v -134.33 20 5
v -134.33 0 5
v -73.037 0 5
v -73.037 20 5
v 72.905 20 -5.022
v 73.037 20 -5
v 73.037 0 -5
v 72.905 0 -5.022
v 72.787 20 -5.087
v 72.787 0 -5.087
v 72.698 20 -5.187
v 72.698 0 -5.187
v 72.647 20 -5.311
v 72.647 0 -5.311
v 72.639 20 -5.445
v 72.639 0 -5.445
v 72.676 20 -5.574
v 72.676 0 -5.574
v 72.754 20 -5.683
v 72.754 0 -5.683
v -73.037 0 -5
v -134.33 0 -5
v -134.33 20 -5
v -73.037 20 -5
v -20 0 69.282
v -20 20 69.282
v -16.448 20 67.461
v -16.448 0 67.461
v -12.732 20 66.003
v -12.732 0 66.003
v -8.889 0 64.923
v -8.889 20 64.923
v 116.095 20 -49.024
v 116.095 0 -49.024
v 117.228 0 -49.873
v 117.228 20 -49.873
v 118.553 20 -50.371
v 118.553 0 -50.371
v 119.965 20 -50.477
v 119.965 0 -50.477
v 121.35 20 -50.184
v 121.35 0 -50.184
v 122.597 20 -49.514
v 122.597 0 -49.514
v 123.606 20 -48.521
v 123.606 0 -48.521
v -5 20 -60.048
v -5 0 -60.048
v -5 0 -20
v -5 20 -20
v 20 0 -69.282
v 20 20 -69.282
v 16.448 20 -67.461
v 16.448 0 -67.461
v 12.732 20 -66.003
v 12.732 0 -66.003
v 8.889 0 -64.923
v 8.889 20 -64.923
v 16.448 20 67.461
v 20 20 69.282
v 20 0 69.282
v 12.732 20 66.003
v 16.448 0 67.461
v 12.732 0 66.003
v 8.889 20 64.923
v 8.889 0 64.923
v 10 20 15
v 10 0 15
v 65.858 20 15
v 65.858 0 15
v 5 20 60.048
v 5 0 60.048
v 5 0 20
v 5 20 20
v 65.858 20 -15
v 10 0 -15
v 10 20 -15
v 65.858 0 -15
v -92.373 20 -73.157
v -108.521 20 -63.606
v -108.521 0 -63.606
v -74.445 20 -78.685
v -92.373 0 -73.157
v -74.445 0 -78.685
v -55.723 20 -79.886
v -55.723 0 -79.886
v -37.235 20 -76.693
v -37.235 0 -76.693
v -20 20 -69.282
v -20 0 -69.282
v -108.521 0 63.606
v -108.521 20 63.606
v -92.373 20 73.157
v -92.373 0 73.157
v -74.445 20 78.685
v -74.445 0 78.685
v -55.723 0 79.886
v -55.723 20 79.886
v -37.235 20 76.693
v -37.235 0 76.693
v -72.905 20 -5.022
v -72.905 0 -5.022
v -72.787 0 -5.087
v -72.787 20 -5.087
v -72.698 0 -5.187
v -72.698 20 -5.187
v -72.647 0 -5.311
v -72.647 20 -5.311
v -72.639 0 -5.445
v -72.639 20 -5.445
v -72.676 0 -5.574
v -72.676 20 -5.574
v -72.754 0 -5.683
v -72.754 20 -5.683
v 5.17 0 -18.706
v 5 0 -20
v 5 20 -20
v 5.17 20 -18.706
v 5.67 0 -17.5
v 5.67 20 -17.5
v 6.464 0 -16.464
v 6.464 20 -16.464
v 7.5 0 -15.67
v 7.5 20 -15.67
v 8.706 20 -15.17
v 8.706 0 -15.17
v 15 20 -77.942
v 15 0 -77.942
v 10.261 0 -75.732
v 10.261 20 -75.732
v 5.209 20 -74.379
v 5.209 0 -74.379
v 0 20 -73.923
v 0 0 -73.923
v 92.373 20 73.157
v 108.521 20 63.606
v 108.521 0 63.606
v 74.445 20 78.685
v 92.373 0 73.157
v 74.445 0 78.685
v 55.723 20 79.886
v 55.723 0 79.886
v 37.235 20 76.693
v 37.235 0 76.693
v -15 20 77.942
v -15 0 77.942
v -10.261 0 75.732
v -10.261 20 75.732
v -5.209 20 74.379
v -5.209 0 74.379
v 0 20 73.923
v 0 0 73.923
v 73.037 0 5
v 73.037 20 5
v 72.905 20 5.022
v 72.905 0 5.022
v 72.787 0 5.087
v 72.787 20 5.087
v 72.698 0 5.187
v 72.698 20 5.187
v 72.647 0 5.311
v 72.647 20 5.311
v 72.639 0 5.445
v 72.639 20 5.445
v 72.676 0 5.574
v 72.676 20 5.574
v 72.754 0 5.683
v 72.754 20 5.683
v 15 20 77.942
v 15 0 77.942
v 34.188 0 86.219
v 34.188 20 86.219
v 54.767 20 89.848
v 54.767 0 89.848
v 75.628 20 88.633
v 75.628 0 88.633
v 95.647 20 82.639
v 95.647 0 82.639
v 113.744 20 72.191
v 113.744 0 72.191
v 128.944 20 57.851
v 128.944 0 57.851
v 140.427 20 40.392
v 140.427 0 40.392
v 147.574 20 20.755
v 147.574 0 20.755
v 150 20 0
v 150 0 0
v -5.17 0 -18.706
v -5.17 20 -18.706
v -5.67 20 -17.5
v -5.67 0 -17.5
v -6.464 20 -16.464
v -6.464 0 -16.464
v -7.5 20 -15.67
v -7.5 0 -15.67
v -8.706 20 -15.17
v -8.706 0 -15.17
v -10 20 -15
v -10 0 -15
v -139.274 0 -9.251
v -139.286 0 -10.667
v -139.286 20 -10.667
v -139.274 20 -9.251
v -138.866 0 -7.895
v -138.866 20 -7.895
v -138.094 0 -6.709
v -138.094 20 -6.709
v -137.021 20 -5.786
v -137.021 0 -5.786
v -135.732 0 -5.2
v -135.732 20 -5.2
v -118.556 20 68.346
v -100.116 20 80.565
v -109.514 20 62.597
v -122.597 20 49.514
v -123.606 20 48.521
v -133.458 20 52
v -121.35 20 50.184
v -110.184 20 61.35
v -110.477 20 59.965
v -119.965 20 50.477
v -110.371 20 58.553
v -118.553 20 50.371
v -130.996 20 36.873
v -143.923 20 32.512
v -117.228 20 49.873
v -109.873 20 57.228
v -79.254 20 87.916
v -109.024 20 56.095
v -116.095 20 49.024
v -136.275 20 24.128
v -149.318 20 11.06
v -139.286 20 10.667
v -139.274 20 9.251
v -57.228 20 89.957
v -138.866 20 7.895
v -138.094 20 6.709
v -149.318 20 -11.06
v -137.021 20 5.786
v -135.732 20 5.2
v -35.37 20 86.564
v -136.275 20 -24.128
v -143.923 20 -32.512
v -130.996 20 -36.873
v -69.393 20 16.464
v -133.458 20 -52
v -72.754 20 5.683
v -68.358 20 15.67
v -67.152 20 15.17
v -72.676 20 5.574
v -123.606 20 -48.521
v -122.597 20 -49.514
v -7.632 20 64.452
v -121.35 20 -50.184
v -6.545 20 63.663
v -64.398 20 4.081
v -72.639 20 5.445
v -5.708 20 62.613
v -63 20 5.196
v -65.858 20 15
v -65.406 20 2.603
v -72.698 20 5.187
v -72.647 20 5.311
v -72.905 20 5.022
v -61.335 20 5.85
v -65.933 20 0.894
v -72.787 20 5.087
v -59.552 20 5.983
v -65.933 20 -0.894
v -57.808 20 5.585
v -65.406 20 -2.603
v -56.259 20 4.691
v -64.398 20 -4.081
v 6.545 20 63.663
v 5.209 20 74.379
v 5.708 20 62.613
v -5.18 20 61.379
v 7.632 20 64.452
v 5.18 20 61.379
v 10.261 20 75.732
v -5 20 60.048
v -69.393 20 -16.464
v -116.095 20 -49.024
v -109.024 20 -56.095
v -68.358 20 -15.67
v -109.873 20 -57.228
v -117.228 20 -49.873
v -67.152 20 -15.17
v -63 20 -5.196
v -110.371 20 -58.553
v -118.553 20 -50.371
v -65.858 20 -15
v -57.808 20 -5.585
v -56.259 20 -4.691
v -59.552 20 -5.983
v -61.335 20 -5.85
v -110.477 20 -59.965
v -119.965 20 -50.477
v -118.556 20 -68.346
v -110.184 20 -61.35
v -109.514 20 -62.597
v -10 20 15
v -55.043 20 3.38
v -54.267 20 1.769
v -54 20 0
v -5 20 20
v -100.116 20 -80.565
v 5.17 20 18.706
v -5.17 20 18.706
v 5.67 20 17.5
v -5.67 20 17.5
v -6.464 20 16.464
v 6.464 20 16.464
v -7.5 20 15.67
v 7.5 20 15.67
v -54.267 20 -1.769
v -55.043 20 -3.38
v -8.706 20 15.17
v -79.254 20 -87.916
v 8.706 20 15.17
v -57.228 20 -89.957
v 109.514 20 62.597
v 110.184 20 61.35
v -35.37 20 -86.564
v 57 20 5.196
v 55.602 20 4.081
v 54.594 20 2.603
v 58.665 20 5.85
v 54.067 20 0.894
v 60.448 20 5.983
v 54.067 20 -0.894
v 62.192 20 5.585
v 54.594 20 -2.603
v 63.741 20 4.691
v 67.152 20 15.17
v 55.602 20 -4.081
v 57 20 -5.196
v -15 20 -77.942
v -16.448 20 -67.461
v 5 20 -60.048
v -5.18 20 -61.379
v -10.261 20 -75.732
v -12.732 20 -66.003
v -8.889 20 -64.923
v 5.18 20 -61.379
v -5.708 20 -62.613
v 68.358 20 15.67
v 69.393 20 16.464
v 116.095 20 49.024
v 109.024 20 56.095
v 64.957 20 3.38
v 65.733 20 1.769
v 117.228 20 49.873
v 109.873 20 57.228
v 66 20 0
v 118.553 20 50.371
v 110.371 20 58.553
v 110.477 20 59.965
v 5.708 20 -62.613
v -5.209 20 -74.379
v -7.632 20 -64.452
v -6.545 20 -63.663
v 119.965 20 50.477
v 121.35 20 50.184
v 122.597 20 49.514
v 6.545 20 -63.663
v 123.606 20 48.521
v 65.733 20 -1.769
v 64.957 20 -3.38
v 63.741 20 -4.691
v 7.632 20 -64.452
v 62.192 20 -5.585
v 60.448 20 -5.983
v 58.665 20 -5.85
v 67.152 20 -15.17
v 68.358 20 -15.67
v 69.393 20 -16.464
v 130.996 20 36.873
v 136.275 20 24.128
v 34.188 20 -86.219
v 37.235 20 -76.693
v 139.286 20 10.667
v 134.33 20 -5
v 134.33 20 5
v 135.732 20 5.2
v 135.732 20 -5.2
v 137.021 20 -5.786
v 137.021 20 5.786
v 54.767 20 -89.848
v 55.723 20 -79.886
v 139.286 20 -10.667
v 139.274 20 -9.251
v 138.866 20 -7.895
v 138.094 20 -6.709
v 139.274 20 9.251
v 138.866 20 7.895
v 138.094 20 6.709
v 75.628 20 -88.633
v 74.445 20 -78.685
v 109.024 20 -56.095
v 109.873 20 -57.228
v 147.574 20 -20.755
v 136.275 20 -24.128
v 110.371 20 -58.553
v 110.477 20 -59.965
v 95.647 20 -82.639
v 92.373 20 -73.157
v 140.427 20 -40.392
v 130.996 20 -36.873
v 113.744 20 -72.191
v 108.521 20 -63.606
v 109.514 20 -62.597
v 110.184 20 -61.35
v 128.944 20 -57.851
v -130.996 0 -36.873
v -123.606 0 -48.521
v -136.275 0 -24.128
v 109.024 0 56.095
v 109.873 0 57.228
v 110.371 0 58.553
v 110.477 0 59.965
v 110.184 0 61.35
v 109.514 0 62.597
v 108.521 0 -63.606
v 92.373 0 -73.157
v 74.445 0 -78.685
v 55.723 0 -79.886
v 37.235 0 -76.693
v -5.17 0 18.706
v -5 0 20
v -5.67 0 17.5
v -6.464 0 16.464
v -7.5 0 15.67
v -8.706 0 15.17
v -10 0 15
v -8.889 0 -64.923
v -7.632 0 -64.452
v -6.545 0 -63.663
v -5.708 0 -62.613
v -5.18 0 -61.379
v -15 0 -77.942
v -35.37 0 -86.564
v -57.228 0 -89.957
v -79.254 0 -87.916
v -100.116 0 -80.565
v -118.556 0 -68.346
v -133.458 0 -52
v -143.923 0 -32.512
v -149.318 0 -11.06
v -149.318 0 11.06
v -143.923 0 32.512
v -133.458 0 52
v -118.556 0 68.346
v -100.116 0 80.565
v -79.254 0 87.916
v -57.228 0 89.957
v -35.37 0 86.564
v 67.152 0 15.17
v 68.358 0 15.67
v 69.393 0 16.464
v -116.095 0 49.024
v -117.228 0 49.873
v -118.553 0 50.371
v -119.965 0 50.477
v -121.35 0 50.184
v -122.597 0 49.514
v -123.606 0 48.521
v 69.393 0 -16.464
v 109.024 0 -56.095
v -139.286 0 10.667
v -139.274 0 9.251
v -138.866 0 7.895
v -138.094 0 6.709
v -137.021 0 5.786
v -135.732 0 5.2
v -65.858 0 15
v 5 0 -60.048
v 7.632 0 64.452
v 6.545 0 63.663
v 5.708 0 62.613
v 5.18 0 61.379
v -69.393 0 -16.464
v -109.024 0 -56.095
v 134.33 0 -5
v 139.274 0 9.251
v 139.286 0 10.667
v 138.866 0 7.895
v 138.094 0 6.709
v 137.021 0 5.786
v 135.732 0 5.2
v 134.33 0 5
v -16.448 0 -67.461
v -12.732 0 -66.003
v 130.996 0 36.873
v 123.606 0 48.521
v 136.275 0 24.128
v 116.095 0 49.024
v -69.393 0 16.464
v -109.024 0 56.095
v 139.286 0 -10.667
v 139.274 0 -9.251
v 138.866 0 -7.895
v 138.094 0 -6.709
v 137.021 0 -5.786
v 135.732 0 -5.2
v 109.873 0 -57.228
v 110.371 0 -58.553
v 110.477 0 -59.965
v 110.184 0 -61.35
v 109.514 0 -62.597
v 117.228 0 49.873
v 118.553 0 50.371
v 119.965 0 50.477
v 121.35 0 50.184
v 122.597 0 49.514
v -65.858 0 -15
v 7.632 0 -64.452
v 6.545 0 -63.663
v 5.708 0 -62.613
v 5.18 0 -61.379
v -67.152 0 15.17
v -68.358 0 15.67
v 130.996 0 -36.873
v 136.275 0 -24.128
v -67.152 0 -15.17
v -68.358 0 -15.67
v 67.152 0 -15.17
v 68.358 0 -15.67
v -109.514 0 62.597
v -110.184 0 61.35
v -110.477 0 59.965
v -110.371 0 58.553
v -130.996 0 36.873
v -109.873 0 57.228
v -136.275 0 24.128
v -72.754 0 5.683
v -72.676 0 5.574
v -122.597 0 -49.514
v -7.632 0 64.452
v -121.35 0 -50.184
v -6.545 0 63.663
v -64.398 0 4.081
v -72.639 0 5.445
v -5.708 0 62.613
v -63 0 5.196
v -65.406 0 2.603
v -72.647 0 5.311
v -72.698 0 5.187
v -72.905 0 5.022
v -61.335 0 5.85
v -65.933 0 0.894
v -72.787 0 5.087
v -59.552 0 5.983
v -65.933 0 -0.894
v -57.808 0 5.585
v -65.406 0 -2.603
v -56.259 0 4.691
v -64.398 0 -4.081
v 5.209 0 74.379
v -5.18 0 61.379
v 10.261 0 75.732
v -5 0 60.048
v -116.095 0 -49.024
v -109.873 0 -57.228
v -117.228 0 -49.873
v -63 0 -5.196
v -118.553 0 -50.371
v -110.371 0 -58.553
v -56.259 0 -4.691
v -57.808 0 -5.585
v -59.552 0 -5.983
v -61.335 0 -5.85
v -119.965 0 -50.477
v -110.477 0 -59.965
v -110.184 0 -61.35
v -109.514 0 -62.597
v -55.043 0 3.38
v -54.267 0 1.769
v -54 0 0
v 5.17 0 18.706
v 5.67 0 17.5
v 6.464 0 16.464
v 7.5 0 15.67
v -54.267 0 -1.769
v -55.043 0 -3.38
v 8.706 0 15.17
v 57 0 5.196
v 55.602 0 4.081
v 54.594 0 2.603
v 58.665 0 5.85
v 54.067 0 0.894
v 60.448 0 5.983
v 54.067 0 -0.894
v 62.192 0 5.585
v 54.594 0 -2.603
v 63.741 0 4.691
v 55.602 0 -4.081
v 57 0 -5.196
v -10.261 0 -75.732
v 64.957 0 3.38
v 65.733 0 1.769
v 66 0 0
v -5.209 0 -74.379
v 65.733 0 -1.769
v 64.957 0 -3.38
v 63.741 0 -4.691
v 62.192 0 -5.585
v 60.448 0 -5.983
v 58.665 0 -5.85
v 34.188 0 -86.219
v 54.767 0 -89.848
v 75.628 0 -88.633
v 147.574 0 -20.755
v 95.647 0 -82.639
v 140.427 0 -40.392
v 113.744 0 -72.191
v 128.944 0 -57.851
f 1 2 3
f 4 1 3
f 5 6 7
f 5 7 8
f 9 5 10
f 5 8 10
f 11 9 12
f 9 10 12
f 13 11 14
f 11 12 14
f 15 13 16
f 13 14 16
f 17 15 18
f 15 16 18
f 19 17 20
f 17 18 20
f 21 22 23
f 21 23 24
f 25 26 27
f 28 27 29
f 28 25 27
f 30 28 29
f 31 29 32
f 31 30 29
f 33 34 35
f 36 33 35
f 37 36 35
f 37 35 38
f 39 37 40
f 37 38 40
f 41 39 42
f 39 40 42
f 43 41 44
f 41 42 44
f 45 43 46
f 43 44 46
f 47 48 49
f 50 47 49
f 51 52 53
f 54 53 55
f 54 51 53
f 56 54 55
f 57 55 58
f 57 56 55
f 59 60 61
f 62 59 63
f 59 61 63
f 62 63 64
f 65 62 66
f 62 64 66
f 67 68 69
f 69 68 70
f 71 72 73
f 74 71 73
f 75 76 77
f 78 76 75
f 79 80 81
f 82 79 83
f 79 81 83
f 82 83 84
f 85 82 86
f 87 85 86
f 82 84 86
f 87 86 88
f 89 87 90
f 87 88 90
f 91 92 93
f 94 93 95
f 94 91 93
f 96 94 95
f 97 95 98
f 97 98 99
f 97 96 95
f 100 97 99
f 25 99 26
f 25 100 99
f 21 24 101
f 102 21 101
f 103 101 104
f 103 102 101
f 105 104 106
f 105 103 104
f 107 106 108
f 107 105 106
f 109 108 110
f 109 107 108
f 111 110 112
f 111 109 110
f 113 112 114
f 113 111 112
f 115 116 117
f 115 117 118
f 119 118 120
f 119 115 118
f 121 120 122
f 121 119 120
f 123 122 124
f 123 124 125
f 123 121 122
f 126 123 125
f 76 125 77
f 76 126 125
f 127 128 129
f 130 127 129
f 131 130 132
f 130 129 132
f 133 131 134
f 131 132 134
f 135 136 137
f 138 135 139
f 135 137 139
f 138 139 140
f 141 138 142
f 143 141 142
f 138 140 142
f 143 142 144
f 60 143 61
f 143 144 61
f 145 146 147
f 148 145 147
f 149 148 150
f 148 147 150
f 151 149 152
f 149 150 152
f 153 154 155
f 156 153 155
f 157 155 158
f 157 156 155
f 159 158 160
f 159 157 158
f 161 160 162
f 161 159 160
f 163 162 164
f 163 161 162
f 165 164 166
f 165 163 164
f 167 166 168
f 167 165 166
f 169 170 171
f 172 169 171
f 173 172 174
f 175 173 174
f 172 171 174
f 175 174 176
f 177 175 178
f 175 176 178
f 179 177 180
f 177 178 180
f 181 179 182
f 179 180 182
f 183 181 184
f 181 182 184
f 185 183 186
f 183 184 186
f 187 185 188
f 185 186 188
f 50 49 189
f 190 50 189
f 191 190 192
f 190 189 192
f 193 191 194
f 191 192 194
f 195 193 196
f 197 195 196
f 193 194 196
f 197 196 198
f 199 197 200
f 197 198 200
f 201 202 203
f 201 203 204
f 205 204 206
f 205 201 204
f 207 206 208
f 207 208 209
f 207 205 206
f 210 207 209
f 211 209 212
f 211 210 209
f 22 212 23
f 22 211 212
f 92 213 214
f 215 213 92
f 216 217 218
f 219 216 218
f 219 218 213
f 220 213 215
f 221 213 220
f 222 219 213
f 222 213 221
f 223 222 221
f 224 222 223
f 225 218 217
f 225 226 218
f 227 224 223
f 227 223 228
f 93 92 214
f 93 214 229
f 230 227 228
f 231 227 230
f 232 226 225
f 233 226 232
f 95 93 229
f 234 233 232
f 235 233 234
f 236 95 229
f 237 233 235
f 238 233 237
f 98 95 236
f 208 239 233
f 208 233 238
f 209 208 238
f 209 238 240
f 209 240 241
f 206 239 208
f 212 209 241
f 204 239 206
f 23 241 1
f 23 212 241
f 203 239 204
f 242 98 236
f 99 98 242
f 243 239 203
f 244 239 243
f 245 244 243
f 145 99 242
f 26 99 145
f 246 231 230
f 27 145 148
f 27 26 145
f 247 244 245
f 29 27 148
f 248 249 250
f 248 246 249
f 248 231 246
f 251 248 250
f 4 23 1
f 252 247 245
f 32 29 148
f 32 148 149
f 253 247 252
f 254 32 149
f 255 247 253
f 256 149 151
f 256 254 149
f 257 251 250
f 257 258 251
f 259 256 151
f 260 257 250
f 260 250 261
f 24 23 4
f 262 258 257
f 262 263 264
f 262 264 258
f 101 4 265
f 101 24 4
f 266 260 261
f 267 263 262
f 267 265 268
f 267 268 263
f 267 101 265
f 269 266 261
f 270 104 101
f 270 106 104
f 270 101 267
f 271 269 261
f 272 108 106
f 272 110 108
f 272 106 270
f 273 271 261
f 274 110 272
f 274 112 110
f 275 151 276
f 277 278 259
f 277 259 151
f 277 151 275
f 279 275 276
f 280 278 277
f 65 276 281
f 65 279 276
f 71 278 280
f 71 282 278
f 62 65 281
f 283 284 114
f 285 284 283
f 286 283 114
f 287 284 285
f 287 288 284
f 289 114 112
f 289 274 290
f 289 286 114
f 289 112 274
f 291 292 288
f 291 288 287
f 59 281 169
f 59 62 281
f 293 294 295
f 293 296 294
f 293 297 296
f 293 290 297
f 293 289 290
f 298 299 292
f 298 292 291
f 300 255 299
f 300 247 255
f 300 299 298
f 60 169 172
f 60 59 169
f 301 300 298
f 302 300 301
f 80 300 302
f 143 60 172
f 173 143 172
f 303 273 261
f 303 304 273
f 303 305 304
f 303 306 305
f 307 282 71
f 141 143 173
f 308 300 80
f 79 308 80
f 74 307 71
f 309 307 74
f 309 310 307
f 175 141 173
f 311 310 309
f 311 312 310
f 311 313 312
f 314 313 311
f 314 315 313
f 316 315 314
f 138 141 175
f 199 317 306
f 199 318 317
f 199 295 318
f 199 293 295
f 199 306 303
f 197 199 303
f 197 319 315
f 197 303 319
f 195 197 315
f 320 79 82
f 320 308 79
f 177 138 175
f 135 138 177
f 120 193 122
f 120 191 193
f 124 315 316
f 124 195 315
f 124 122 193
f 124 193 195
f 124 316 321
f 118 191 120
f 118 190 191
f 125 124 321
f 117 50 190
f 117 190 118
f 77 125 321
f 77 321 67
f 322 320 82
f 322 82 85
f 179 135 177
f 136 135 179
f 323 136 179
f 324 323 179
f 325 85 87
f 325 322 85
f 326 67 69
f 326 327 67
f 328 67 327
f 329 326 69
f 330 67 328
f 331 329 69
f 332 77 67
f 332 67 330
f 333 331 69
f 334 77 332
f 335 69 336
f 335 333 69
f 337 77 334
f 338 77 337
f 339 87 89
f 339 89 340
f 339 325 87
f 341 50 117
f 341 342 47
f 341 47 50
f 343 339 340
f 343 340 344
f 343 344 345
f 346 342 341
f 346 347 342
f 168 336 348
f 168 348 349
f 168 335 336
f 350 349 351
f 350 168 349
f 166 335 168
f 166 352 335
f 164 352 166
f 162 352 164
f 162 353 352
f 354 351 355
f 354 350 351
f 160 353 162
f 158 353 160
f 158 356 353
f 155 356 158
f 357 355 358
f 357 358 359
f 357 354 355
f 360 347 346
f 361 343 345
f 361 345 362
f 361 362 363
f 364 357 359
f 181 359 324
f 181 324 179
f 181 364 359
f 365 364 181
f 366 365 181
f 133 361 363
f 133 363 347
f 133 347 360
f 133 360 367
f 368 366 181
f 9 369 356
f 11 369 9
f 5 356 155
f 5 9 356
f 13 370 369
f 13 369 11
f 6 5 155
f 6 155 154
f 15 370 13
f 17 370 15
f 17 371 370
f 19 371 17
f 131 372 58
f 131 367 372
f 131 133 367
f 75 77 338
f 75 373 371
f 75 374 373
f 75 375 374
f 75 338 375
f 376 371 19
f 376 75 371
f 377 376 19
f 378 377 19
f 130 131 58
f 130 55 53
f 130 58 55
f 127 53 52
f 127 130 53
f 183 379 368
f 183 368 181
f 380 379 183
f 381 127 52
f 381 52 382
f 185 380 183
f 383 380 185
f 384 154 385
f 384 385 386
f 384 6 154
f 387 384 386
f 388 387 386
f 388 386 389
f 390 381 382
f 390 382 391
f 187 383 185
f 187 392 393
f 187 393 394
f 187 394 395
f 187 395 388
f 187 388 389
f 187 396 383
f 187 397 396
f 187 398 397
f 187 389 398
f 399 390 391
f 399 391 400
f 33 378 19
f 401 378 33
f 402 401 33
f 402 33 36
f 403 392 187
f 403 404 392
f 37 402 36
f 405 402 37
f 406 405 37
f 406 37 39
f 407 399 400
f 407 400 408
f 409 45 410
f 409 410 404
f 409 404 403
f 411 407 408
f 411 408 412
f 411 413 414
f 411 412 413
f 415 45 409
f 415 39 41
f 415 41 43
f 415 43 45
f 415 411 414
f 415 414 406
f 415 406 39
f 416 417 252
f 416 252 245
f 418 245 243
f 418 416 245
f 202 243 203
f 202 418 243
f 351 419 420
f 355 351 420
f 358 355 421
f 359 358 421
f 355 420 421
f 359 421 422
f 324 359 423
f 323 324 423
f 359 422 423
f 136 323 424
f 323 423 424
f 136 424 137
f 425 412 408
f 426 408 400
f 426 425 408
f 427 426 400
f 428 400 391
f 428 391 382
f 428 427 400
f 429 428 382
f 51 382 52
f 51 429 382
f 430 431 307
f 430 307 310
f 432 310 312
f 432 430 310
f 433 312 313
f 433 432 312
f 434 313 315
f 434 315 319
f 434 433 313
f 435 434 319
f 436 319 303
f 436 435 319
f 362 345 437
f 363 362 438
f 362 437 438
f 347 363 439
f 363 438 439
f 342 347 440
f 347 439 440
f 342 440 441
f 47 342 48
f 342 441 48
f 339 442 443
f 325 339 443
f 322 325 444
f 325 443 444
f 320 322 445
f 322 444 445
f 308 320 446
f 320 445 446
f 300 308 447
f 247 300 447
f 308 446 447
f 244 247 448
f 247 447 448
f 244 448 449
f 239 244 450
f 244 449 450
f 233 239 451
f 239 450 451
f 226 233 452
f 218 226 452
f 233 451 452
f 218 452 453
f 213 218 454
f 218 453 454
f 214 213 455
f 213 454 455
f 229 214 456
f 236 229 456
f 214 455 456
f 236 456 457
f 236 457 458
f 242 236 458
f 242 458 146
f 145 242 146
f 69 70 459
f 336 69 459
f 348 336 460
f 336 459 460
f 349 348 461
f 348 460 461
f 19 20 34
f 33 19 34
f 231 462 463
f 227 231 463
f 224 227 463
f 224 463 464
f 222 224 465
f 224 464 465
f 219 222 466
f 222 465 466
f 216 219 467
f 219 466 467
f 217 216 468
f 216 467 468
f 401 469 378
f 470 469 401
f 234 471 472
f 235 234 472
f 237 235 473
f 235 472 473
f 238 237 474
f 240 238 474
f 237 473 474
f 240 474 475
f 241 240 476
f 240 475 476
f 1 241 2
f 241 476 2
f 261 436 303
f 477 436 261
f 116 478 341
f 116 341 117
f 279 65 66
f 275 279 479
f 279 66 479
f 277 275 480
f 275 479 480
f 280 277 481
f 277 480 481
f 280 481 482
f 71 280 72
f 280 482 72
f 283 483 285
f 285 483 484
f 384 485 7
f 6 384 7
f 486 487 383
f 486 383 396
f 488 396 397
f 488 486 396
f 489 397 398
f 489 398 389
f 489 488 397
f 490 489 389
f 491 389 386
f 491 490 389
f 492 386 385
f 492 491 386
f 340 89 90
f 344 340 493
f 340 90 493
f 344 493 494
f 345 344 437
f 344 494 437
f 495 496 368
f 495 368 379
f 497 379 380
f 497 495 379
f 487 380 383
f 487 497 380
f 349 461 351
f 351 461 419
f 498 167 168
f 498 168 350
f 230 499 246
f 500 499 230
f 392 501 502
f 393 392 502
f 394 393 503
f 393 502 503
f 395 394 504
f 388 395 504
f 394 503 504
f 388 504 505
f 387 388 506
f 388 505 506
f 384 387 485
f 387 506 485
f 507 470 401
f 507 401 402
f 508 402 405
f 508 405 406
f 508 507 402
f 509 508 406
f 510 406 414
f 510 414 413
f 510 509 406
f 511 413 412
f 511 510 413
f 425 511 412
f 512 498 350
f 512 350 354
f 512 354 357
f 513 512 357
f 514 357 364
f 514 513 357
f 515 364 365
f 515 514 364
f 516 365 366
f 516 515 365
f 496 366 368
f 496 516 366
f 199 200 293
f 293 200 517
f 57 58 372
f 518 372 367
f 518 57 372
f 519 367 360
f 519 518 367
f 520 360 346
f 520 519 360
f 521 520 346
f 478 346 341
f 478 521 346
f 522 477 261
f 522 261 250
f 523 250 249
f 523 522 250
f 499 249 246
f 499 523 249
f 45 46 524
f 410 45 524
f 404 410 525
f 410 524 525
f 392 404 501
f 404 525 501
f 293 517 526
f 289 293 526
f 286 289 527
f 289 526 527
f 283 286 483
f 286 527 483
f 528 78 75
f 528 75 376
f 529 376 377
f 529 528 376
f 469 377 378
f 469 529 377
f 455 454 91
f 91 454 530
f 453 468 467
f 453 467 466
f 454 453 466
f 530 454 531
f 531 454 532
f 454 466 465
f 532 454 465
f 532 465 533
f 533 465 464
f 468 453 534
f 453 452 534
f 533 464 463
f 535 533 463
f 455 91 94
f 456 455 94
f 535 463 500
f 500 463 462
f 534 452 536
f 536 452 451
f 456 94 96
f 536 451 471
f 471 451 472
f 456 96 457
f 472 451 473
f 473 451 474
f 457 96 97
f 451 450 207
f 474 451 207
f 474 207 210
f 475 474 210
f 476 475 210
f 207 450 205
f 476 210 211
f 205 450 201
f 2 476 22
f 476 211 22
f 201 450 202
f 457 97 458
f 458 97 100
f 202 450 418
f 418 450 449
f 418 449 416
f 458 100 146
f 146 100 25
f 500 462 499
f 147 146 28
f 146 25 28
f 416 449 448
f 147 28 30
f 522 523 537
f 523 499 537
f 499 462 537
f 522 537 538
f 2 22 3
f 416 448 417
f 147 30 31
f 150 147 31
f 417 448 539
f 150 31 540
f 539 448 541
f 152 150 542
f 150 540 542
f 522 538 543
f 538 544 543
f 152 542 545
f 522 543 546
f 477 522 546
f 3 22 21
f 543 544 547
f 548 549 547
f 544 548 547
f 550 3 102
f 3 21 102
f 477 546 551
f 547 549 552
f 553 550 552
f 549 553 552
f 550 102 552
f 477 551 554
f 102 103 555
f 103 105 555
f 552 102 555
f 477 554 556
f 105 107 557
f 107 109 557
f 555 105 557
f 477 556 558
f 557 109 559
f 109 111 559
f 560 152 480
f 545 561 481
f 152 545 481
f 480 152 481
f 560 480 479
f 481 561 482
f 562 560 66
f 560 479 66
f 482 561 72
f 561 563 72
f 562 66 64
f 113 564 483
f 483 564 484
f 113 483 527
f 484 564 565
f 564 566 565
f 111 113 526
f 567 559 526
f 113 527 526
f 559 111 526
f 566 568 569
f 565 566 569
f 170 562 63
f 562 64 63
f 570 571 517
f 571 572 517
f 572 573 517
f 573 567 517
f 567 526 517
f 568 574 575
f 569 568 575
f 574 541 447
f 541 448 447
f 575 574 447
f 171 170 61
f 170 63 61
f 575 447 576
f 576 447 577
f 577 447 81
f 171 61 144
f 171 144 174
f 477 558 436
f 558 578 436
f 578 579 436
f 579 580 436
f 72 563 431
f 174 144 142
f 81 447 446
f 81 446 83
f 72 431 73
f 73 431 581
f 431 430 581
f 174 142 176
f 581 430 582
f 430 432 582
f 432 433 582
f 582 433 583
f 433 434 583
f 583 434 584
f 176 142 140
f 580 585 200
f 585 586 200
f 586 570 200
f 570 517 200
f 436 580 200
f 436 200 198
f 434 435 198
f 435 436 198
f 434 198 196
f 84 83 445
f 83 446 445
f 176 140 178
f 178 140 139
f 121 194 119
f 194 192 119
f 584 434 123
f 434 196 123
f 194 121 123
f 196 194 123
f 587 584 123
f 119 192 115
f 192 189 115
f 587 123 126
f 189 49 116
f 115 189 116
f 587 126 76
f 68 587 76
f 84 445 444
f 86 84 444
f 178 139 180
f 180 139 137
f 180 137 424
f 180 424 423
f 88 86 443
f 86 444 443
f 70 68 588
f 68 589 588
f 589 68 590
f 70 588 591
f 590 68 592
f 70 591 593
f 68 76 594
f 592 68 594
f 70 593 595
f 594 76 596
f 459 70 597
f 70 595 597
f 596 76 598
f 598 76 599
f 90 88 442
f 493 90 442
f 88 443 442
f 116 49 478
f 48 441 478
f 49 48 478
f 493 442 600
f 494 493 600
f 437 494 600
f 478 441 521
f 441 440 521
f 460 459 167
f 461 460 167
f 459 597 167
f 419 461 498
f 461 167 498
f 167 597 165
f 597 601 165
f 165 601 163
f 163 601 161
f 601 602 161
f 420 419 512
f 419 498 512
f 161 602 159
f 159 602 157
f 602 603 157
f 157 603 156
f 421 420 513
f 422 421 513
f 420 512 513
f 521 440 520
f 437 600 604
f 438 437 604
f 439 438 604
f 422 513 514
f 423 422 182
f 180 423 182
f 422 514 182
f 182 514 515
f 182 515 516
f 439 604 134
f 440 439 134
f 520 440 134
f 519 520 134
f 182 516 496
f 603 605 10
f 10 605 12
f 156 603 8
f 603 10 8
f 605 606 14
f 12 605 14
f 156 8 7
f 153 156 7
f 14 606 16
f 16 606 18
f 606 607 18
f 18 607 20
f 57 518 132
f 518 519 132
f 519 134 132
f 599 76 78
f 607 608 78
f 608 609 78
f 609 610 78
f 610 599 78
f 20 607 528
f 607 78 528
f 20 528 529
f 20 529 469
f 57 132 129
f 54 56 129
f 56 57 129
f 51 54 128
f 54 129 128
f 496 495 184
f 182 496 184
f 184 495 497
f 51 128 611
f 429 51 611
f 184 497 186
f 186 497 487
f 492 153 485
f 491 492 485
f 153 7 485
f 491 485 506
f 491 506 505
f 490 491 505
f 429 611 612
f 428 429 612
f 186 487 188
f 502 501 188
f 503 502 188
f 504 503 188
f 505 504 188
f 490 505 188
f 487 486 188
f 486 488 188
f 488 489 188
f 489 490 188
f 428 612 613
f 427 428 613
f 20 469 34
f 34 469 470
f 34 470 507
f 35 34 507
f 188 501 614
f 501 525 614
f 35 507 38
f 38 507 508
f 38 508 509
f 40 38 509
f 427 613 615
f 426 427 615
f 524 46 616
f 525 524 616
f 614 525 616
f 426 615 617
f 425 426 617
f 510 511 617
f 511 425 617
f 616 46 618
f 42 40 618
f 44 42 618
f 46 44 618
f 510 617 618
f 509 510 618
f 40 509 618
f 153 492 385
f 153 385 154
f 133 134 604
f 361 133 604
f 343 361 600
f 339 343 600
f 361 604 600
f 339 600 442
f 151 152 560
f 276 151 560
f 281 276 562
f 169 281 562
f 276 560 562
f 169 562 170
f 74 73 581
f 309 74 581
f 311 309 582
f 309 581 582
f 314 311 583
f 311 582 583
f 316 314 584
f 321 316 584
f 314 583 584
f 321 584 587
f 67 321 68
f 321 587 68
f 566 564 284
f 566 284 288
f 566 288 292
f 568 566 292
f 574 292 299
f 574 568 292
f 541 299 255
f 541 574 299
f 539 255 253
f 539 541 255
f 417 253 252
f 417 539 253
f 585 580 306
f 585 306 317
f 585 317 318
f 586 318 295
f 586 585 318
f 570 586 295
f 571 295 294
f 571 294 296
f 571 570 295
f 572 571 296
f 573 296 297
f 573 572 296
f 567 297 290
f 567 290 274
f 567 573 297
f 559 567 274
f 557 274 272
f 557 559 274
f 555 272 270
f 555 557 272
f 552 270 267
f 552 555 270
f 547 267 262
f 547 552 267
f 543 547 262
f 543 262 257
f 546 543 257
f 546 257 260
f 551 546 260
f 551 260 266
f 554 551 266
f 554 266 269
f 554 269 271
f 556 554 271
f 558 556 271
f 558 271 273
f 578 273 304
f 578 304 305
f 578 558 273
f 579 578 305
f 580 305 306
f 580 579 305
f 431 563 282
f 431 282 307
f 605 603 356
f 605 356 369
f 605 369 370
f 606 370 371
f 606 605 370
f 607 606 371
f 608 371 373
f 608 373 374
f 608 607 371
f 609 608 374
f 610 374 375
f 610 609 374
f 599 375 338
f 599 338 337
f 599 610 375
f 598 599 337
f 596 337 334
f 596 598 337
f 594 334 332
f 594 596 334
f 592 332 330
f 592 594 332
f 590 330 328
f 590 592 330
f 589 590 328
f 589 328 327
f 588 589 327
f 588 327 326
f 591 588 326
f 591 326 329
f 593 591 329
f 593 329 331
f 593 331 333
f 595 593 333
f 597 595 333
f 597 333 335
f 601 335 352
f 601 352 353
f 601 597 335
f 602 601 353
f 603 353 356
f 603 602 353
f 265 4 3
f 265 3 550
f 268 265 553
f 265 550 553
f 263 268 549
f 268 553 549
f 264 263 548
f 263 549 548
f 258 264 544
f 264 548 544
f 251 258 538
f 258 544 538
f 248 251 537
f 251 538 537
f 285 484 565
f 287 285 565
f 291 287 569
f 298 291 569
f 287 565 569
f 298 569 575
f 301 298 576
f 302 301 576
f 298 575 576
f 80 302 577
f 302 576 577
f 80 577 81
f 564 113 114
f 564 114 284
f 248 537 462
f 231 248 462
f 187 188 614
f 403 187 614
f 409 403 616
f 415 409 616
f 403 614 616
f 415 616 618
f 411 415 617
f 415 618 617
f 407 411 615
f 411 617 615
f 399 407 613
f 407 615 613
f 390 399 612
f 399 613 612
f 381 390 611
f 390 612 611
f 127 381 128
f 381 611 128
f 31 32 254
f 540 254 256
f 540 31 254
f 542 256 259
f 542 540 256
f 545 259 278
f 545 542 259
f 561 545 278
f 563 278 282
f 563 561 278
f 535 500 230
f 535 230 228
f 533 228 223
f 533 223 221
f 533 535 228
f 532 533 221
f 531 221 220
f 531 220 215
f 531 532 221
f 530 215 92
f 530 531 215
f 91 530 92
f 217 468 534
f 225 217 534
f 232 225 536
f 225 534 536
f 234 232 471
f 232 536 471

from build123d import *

# Parameters (mm, degrees)
SKETCH2_R           = 6
BOSS_EXTRUDE1_DEPTH = 20


with BuildPart() as part:
    # Sketch2 → Boss-Extrude1 (new body)
    with BuildSketch(Plane(origin=(0, 0, 0), x_dir=(1, 0, 0), z_dir=(0, 1, 0))):
        with BuildLine():
            ThreePointArc((150, 0), (105, 77.942286341), (15, 77.942286341))
            ThreePointArc((15, 77.942286341), (7.764571353, 74.945273665), (0, 73.923048454))
            ThreePointArc((0, 73.923048454), (-7.764571353, 74.945273665), (-15, 77.942286341))
            ThreePointArc((-15, 77.942286341), (-150, 0), (-15, -77.942286341))
            ThreePointArc((-15, -77.942286341), (-7.764571353, -74.945273665), (0, -73.923048454))
            ThreePointArc((0, -73.923048454), (7.764571353, -74.945273665), (15, -77.942286341))
            ThreePointArc((15, -77.942286341), (105, -77.942286341), (150, 0))
        make_face()
        with Locations((60, 0)):
            Circle(SKETCH2_R, mode=Mode.SUBTRACT)
        with Locations((-60, 0)):
            Circle(SKETCH2_R, mode=Mode.SUBTRACT)
        with BuildLine():
            Line((5, 60.048226517), (5, 20))
            ThreePointArc((5, 20), (6.464466094, 16.464466094), (10, 15))
            Line((10, 15), (65.857864376, 15))
            ThreePointArc((65.857864376, 15), (67.771281538, 15.380602337), (69.393398282, 16.464466094))
            Line((69.393398282, 16.464466094), (109.023956198, 56.09502401))
            ThreePointArc((109.023956198, 56.09502401), (110.47724887, 59.964637812), (108.520983778, 63.605928444))
            ThreePointArc((108.520983778, 63.605928444), (65.119211843, 79.836042425), (20, 69.282032303))
            ThreePointArc((20, 69.282032303), (14.607936726, 66.68586026), (8.888888889, 64.923206732))
            ThreePointArc((8.888888889, 64.923206732), (6.0913202, 63.166274339), (5, 60.048226517))
        make_face(mode=Mode.SUBTRACT)
        with BuildLine():
            Line((134.330343737, 5), (73.036753237, 5))
            ThreePointArc((73.036753237, 5), (72.667201424, 5.246926627), (72.753910524, 5.682842712))
            Line((72.753910524, 5.682842712), (116.09502401, 49.023956198))
            ThreePointArc((116.09502401, 49.023956198), (119.964637812, 50.47724887), (123.605928444, 48.520983778))
            ThreePointArc((123.605928444, 48.520983778), (133.910362601, 30.614674589), (139.285699986, 10.666666667))
            ThreePointArc((139.285699986, 10.666666667), (138.094207, 6.708597057), (134.330343737, 5))
        make_face(mode=Mode.SUBTRACT)
        with BuildLine():
            Line((-72.753910524, 5.682842712), (-116.09502401, 49.023956198))
            ThreePointArc((-116.09502401, 49.023956198), (-119.964637812, 50.47724887), (-123.605928444, 48.520983778))
            ThreePointArc((-123.605928444, 48.520983778), (-133.910362601, 30.614674589), (-139.285699986, 10.666666667))
            ThreePointArc((-139.285699986, 10.666666667), (-138.094207, 6.708597057), (-134.330343737, 5))
            Line((-134.330343737, 5), (-73.036753237, 5))
            ThreePointArc((-73.036753237, 5), (-72.667201424, 5.246926627), (-72.753910524, 5.682842712))
        make_face(mode=Mode.SUBTRACT)
        with BuildLine():
            Line((-69.393398282, 16.464466094), (-109.023956198, 56.09502401))
            ThreePointArc((-109.023956198, 56.09502401), (-110.47724887, 59.964637812), (-108.520983778, 63.605928444))
            ThreePointArc((-108.520983778, 63.605928444), (-65.119211843, 79.836042425), (-20, 69.282032303))
            ThreePointArc((-20, 69.282032303), (-14.607936726, 66.68586026), (-8.888888889, 64.923206732))
            ThreePointArc((-8.888888889, 64.923206732), (-6.0913202, 63.166274339), (-5, 60.048226517))
            Line((-5, 60.048226517), (-5, 20))
            ThreePointArc((-5, 20), (-6.464466094, 16.464466094), (-10, 15))
            Line((-10, 15), (-65.857864376, 15))
            ThreePointArc((-65.857864376, 15), (-67.771281538, 15.380602337), (-69.393398282, 16.464466094))
        make_face(mode=Mode.SUBTRACT)
        with BuildLine():
            Line((-5, -60.048226517), (-5, -20))
            ThreePointArc((-5, -20), (-6.464466094, -16.464466094), (-10, -15))
            Line((-10, -15), (-65.857864376, -15))
            ThreePointArc((-65.857864376, -15), (-67.771281538, -15.380602337), (-69.393398282, -16.464466094))
            Line((-69.393398282, -16.464466094), (-109.023956198, -56.09502401))
            ThreePointArc((-109.023956198, -56.09502401), (-110.47724887, -59.964637812), (-108.520983778, -63.605928444))
            ThreePointArc((-108.520983778, -63.605928444), (-65.119211843, -79.836042425), (-20, -69.282032303))
            ThreePointArc((-20, -69.282032303), (-14.607936726, -66.68586026), (-8.888888889, -64.923206732))
            ThreePointArc((-8.888888889, -64.923206732), (-6.0913202, -63.166274339), (-5, -60.048226517))
        make_face(mode=Mode.SUBTRACT)
        with BuildLine():
            Line((-134.330343737, -5), (-73.036753237, -5))
            ThreePointArc((-73.036753237, -5), (-72.667201424, -5.246926627), (-72.753910524, -5.682842712))
            Line((-72.753910524, -5.682842712), (-116.09502401, -49.023956198))
            ThreePointArc((-116.09502401, -49.023956198), (-119.964637812, -50.47724887), (-123.605928444, -48.520983778))
            ThreePointArc((-123.605928444, -48.520983778), (-133.910362601, -30.614674589), (-139.285699986, -10.666666667))
            ThreePointArc((-139.285699986, -10.666666667), (-138.094207, -6.708597057), (-134.330343737, -5))
        make_face(mode=Mode.SUBTRACT)
        with BuildLine():
            Line((72.753910524, -5.682842712), (116.09502401, -49.023956198))
            ThreePointArc((116.09502401, -49.023956198), (119.964637812, -50.47724887), (123.605928444, -48.520983778))
            ThreePointArc((123.605928444, -48.520983778), (133.910362601, -30.614674589), (139.285699986, -10.666666667))
            ThreePointArc((139.285699986, -10.666666667), (138.094207, -6.708597057), (134.330343737, -5))
            Line((134.330343737, -5), (73.036753237, -5))
            ThreePointArc((73.036753237, -5), (72.667201424, -5.246926627), (72.753910524, -5.682842712))
        make_face(mode=Mode.SUBTRACT)
        with BuildLine():
            Line((69.393398282, -16.464466094), (109.023956198, -56.09502401))
            ThreePointArc((109.023956198, -56.09502401), (110.47724887, -59.964637812), (108.520983778, -63.605928444))
            ThreePointArc((108.520983778, -63.605928444), (65.119211843, -79.836042425), (20, -69.282032303))
            ThreePointArc((20, -69.282032303), (14.607936726, -66.68586026), (8.888888889, -64.923206732))
            ThreePointArc((8.888888889, -64.923206732), (6.0913202, -63.166274339), (5, -60.048226517))
            Line((5, -60.048226517), (5, -20))
            ThreePointArc((5, -20), (6.464466094, -16.464466094), (10, -15))
            Line((10, -15), (65.857864376, -15))
            ThreePointArc((65.857864376, -15), (67.771281538, -15.380602337), (69.393398282, -16.464466094))
        make_face(mode=Mode.SUBTRACT)
    extrude(amount=BOSS_EXTRUDE1_DEPTH)


solid = part.part
